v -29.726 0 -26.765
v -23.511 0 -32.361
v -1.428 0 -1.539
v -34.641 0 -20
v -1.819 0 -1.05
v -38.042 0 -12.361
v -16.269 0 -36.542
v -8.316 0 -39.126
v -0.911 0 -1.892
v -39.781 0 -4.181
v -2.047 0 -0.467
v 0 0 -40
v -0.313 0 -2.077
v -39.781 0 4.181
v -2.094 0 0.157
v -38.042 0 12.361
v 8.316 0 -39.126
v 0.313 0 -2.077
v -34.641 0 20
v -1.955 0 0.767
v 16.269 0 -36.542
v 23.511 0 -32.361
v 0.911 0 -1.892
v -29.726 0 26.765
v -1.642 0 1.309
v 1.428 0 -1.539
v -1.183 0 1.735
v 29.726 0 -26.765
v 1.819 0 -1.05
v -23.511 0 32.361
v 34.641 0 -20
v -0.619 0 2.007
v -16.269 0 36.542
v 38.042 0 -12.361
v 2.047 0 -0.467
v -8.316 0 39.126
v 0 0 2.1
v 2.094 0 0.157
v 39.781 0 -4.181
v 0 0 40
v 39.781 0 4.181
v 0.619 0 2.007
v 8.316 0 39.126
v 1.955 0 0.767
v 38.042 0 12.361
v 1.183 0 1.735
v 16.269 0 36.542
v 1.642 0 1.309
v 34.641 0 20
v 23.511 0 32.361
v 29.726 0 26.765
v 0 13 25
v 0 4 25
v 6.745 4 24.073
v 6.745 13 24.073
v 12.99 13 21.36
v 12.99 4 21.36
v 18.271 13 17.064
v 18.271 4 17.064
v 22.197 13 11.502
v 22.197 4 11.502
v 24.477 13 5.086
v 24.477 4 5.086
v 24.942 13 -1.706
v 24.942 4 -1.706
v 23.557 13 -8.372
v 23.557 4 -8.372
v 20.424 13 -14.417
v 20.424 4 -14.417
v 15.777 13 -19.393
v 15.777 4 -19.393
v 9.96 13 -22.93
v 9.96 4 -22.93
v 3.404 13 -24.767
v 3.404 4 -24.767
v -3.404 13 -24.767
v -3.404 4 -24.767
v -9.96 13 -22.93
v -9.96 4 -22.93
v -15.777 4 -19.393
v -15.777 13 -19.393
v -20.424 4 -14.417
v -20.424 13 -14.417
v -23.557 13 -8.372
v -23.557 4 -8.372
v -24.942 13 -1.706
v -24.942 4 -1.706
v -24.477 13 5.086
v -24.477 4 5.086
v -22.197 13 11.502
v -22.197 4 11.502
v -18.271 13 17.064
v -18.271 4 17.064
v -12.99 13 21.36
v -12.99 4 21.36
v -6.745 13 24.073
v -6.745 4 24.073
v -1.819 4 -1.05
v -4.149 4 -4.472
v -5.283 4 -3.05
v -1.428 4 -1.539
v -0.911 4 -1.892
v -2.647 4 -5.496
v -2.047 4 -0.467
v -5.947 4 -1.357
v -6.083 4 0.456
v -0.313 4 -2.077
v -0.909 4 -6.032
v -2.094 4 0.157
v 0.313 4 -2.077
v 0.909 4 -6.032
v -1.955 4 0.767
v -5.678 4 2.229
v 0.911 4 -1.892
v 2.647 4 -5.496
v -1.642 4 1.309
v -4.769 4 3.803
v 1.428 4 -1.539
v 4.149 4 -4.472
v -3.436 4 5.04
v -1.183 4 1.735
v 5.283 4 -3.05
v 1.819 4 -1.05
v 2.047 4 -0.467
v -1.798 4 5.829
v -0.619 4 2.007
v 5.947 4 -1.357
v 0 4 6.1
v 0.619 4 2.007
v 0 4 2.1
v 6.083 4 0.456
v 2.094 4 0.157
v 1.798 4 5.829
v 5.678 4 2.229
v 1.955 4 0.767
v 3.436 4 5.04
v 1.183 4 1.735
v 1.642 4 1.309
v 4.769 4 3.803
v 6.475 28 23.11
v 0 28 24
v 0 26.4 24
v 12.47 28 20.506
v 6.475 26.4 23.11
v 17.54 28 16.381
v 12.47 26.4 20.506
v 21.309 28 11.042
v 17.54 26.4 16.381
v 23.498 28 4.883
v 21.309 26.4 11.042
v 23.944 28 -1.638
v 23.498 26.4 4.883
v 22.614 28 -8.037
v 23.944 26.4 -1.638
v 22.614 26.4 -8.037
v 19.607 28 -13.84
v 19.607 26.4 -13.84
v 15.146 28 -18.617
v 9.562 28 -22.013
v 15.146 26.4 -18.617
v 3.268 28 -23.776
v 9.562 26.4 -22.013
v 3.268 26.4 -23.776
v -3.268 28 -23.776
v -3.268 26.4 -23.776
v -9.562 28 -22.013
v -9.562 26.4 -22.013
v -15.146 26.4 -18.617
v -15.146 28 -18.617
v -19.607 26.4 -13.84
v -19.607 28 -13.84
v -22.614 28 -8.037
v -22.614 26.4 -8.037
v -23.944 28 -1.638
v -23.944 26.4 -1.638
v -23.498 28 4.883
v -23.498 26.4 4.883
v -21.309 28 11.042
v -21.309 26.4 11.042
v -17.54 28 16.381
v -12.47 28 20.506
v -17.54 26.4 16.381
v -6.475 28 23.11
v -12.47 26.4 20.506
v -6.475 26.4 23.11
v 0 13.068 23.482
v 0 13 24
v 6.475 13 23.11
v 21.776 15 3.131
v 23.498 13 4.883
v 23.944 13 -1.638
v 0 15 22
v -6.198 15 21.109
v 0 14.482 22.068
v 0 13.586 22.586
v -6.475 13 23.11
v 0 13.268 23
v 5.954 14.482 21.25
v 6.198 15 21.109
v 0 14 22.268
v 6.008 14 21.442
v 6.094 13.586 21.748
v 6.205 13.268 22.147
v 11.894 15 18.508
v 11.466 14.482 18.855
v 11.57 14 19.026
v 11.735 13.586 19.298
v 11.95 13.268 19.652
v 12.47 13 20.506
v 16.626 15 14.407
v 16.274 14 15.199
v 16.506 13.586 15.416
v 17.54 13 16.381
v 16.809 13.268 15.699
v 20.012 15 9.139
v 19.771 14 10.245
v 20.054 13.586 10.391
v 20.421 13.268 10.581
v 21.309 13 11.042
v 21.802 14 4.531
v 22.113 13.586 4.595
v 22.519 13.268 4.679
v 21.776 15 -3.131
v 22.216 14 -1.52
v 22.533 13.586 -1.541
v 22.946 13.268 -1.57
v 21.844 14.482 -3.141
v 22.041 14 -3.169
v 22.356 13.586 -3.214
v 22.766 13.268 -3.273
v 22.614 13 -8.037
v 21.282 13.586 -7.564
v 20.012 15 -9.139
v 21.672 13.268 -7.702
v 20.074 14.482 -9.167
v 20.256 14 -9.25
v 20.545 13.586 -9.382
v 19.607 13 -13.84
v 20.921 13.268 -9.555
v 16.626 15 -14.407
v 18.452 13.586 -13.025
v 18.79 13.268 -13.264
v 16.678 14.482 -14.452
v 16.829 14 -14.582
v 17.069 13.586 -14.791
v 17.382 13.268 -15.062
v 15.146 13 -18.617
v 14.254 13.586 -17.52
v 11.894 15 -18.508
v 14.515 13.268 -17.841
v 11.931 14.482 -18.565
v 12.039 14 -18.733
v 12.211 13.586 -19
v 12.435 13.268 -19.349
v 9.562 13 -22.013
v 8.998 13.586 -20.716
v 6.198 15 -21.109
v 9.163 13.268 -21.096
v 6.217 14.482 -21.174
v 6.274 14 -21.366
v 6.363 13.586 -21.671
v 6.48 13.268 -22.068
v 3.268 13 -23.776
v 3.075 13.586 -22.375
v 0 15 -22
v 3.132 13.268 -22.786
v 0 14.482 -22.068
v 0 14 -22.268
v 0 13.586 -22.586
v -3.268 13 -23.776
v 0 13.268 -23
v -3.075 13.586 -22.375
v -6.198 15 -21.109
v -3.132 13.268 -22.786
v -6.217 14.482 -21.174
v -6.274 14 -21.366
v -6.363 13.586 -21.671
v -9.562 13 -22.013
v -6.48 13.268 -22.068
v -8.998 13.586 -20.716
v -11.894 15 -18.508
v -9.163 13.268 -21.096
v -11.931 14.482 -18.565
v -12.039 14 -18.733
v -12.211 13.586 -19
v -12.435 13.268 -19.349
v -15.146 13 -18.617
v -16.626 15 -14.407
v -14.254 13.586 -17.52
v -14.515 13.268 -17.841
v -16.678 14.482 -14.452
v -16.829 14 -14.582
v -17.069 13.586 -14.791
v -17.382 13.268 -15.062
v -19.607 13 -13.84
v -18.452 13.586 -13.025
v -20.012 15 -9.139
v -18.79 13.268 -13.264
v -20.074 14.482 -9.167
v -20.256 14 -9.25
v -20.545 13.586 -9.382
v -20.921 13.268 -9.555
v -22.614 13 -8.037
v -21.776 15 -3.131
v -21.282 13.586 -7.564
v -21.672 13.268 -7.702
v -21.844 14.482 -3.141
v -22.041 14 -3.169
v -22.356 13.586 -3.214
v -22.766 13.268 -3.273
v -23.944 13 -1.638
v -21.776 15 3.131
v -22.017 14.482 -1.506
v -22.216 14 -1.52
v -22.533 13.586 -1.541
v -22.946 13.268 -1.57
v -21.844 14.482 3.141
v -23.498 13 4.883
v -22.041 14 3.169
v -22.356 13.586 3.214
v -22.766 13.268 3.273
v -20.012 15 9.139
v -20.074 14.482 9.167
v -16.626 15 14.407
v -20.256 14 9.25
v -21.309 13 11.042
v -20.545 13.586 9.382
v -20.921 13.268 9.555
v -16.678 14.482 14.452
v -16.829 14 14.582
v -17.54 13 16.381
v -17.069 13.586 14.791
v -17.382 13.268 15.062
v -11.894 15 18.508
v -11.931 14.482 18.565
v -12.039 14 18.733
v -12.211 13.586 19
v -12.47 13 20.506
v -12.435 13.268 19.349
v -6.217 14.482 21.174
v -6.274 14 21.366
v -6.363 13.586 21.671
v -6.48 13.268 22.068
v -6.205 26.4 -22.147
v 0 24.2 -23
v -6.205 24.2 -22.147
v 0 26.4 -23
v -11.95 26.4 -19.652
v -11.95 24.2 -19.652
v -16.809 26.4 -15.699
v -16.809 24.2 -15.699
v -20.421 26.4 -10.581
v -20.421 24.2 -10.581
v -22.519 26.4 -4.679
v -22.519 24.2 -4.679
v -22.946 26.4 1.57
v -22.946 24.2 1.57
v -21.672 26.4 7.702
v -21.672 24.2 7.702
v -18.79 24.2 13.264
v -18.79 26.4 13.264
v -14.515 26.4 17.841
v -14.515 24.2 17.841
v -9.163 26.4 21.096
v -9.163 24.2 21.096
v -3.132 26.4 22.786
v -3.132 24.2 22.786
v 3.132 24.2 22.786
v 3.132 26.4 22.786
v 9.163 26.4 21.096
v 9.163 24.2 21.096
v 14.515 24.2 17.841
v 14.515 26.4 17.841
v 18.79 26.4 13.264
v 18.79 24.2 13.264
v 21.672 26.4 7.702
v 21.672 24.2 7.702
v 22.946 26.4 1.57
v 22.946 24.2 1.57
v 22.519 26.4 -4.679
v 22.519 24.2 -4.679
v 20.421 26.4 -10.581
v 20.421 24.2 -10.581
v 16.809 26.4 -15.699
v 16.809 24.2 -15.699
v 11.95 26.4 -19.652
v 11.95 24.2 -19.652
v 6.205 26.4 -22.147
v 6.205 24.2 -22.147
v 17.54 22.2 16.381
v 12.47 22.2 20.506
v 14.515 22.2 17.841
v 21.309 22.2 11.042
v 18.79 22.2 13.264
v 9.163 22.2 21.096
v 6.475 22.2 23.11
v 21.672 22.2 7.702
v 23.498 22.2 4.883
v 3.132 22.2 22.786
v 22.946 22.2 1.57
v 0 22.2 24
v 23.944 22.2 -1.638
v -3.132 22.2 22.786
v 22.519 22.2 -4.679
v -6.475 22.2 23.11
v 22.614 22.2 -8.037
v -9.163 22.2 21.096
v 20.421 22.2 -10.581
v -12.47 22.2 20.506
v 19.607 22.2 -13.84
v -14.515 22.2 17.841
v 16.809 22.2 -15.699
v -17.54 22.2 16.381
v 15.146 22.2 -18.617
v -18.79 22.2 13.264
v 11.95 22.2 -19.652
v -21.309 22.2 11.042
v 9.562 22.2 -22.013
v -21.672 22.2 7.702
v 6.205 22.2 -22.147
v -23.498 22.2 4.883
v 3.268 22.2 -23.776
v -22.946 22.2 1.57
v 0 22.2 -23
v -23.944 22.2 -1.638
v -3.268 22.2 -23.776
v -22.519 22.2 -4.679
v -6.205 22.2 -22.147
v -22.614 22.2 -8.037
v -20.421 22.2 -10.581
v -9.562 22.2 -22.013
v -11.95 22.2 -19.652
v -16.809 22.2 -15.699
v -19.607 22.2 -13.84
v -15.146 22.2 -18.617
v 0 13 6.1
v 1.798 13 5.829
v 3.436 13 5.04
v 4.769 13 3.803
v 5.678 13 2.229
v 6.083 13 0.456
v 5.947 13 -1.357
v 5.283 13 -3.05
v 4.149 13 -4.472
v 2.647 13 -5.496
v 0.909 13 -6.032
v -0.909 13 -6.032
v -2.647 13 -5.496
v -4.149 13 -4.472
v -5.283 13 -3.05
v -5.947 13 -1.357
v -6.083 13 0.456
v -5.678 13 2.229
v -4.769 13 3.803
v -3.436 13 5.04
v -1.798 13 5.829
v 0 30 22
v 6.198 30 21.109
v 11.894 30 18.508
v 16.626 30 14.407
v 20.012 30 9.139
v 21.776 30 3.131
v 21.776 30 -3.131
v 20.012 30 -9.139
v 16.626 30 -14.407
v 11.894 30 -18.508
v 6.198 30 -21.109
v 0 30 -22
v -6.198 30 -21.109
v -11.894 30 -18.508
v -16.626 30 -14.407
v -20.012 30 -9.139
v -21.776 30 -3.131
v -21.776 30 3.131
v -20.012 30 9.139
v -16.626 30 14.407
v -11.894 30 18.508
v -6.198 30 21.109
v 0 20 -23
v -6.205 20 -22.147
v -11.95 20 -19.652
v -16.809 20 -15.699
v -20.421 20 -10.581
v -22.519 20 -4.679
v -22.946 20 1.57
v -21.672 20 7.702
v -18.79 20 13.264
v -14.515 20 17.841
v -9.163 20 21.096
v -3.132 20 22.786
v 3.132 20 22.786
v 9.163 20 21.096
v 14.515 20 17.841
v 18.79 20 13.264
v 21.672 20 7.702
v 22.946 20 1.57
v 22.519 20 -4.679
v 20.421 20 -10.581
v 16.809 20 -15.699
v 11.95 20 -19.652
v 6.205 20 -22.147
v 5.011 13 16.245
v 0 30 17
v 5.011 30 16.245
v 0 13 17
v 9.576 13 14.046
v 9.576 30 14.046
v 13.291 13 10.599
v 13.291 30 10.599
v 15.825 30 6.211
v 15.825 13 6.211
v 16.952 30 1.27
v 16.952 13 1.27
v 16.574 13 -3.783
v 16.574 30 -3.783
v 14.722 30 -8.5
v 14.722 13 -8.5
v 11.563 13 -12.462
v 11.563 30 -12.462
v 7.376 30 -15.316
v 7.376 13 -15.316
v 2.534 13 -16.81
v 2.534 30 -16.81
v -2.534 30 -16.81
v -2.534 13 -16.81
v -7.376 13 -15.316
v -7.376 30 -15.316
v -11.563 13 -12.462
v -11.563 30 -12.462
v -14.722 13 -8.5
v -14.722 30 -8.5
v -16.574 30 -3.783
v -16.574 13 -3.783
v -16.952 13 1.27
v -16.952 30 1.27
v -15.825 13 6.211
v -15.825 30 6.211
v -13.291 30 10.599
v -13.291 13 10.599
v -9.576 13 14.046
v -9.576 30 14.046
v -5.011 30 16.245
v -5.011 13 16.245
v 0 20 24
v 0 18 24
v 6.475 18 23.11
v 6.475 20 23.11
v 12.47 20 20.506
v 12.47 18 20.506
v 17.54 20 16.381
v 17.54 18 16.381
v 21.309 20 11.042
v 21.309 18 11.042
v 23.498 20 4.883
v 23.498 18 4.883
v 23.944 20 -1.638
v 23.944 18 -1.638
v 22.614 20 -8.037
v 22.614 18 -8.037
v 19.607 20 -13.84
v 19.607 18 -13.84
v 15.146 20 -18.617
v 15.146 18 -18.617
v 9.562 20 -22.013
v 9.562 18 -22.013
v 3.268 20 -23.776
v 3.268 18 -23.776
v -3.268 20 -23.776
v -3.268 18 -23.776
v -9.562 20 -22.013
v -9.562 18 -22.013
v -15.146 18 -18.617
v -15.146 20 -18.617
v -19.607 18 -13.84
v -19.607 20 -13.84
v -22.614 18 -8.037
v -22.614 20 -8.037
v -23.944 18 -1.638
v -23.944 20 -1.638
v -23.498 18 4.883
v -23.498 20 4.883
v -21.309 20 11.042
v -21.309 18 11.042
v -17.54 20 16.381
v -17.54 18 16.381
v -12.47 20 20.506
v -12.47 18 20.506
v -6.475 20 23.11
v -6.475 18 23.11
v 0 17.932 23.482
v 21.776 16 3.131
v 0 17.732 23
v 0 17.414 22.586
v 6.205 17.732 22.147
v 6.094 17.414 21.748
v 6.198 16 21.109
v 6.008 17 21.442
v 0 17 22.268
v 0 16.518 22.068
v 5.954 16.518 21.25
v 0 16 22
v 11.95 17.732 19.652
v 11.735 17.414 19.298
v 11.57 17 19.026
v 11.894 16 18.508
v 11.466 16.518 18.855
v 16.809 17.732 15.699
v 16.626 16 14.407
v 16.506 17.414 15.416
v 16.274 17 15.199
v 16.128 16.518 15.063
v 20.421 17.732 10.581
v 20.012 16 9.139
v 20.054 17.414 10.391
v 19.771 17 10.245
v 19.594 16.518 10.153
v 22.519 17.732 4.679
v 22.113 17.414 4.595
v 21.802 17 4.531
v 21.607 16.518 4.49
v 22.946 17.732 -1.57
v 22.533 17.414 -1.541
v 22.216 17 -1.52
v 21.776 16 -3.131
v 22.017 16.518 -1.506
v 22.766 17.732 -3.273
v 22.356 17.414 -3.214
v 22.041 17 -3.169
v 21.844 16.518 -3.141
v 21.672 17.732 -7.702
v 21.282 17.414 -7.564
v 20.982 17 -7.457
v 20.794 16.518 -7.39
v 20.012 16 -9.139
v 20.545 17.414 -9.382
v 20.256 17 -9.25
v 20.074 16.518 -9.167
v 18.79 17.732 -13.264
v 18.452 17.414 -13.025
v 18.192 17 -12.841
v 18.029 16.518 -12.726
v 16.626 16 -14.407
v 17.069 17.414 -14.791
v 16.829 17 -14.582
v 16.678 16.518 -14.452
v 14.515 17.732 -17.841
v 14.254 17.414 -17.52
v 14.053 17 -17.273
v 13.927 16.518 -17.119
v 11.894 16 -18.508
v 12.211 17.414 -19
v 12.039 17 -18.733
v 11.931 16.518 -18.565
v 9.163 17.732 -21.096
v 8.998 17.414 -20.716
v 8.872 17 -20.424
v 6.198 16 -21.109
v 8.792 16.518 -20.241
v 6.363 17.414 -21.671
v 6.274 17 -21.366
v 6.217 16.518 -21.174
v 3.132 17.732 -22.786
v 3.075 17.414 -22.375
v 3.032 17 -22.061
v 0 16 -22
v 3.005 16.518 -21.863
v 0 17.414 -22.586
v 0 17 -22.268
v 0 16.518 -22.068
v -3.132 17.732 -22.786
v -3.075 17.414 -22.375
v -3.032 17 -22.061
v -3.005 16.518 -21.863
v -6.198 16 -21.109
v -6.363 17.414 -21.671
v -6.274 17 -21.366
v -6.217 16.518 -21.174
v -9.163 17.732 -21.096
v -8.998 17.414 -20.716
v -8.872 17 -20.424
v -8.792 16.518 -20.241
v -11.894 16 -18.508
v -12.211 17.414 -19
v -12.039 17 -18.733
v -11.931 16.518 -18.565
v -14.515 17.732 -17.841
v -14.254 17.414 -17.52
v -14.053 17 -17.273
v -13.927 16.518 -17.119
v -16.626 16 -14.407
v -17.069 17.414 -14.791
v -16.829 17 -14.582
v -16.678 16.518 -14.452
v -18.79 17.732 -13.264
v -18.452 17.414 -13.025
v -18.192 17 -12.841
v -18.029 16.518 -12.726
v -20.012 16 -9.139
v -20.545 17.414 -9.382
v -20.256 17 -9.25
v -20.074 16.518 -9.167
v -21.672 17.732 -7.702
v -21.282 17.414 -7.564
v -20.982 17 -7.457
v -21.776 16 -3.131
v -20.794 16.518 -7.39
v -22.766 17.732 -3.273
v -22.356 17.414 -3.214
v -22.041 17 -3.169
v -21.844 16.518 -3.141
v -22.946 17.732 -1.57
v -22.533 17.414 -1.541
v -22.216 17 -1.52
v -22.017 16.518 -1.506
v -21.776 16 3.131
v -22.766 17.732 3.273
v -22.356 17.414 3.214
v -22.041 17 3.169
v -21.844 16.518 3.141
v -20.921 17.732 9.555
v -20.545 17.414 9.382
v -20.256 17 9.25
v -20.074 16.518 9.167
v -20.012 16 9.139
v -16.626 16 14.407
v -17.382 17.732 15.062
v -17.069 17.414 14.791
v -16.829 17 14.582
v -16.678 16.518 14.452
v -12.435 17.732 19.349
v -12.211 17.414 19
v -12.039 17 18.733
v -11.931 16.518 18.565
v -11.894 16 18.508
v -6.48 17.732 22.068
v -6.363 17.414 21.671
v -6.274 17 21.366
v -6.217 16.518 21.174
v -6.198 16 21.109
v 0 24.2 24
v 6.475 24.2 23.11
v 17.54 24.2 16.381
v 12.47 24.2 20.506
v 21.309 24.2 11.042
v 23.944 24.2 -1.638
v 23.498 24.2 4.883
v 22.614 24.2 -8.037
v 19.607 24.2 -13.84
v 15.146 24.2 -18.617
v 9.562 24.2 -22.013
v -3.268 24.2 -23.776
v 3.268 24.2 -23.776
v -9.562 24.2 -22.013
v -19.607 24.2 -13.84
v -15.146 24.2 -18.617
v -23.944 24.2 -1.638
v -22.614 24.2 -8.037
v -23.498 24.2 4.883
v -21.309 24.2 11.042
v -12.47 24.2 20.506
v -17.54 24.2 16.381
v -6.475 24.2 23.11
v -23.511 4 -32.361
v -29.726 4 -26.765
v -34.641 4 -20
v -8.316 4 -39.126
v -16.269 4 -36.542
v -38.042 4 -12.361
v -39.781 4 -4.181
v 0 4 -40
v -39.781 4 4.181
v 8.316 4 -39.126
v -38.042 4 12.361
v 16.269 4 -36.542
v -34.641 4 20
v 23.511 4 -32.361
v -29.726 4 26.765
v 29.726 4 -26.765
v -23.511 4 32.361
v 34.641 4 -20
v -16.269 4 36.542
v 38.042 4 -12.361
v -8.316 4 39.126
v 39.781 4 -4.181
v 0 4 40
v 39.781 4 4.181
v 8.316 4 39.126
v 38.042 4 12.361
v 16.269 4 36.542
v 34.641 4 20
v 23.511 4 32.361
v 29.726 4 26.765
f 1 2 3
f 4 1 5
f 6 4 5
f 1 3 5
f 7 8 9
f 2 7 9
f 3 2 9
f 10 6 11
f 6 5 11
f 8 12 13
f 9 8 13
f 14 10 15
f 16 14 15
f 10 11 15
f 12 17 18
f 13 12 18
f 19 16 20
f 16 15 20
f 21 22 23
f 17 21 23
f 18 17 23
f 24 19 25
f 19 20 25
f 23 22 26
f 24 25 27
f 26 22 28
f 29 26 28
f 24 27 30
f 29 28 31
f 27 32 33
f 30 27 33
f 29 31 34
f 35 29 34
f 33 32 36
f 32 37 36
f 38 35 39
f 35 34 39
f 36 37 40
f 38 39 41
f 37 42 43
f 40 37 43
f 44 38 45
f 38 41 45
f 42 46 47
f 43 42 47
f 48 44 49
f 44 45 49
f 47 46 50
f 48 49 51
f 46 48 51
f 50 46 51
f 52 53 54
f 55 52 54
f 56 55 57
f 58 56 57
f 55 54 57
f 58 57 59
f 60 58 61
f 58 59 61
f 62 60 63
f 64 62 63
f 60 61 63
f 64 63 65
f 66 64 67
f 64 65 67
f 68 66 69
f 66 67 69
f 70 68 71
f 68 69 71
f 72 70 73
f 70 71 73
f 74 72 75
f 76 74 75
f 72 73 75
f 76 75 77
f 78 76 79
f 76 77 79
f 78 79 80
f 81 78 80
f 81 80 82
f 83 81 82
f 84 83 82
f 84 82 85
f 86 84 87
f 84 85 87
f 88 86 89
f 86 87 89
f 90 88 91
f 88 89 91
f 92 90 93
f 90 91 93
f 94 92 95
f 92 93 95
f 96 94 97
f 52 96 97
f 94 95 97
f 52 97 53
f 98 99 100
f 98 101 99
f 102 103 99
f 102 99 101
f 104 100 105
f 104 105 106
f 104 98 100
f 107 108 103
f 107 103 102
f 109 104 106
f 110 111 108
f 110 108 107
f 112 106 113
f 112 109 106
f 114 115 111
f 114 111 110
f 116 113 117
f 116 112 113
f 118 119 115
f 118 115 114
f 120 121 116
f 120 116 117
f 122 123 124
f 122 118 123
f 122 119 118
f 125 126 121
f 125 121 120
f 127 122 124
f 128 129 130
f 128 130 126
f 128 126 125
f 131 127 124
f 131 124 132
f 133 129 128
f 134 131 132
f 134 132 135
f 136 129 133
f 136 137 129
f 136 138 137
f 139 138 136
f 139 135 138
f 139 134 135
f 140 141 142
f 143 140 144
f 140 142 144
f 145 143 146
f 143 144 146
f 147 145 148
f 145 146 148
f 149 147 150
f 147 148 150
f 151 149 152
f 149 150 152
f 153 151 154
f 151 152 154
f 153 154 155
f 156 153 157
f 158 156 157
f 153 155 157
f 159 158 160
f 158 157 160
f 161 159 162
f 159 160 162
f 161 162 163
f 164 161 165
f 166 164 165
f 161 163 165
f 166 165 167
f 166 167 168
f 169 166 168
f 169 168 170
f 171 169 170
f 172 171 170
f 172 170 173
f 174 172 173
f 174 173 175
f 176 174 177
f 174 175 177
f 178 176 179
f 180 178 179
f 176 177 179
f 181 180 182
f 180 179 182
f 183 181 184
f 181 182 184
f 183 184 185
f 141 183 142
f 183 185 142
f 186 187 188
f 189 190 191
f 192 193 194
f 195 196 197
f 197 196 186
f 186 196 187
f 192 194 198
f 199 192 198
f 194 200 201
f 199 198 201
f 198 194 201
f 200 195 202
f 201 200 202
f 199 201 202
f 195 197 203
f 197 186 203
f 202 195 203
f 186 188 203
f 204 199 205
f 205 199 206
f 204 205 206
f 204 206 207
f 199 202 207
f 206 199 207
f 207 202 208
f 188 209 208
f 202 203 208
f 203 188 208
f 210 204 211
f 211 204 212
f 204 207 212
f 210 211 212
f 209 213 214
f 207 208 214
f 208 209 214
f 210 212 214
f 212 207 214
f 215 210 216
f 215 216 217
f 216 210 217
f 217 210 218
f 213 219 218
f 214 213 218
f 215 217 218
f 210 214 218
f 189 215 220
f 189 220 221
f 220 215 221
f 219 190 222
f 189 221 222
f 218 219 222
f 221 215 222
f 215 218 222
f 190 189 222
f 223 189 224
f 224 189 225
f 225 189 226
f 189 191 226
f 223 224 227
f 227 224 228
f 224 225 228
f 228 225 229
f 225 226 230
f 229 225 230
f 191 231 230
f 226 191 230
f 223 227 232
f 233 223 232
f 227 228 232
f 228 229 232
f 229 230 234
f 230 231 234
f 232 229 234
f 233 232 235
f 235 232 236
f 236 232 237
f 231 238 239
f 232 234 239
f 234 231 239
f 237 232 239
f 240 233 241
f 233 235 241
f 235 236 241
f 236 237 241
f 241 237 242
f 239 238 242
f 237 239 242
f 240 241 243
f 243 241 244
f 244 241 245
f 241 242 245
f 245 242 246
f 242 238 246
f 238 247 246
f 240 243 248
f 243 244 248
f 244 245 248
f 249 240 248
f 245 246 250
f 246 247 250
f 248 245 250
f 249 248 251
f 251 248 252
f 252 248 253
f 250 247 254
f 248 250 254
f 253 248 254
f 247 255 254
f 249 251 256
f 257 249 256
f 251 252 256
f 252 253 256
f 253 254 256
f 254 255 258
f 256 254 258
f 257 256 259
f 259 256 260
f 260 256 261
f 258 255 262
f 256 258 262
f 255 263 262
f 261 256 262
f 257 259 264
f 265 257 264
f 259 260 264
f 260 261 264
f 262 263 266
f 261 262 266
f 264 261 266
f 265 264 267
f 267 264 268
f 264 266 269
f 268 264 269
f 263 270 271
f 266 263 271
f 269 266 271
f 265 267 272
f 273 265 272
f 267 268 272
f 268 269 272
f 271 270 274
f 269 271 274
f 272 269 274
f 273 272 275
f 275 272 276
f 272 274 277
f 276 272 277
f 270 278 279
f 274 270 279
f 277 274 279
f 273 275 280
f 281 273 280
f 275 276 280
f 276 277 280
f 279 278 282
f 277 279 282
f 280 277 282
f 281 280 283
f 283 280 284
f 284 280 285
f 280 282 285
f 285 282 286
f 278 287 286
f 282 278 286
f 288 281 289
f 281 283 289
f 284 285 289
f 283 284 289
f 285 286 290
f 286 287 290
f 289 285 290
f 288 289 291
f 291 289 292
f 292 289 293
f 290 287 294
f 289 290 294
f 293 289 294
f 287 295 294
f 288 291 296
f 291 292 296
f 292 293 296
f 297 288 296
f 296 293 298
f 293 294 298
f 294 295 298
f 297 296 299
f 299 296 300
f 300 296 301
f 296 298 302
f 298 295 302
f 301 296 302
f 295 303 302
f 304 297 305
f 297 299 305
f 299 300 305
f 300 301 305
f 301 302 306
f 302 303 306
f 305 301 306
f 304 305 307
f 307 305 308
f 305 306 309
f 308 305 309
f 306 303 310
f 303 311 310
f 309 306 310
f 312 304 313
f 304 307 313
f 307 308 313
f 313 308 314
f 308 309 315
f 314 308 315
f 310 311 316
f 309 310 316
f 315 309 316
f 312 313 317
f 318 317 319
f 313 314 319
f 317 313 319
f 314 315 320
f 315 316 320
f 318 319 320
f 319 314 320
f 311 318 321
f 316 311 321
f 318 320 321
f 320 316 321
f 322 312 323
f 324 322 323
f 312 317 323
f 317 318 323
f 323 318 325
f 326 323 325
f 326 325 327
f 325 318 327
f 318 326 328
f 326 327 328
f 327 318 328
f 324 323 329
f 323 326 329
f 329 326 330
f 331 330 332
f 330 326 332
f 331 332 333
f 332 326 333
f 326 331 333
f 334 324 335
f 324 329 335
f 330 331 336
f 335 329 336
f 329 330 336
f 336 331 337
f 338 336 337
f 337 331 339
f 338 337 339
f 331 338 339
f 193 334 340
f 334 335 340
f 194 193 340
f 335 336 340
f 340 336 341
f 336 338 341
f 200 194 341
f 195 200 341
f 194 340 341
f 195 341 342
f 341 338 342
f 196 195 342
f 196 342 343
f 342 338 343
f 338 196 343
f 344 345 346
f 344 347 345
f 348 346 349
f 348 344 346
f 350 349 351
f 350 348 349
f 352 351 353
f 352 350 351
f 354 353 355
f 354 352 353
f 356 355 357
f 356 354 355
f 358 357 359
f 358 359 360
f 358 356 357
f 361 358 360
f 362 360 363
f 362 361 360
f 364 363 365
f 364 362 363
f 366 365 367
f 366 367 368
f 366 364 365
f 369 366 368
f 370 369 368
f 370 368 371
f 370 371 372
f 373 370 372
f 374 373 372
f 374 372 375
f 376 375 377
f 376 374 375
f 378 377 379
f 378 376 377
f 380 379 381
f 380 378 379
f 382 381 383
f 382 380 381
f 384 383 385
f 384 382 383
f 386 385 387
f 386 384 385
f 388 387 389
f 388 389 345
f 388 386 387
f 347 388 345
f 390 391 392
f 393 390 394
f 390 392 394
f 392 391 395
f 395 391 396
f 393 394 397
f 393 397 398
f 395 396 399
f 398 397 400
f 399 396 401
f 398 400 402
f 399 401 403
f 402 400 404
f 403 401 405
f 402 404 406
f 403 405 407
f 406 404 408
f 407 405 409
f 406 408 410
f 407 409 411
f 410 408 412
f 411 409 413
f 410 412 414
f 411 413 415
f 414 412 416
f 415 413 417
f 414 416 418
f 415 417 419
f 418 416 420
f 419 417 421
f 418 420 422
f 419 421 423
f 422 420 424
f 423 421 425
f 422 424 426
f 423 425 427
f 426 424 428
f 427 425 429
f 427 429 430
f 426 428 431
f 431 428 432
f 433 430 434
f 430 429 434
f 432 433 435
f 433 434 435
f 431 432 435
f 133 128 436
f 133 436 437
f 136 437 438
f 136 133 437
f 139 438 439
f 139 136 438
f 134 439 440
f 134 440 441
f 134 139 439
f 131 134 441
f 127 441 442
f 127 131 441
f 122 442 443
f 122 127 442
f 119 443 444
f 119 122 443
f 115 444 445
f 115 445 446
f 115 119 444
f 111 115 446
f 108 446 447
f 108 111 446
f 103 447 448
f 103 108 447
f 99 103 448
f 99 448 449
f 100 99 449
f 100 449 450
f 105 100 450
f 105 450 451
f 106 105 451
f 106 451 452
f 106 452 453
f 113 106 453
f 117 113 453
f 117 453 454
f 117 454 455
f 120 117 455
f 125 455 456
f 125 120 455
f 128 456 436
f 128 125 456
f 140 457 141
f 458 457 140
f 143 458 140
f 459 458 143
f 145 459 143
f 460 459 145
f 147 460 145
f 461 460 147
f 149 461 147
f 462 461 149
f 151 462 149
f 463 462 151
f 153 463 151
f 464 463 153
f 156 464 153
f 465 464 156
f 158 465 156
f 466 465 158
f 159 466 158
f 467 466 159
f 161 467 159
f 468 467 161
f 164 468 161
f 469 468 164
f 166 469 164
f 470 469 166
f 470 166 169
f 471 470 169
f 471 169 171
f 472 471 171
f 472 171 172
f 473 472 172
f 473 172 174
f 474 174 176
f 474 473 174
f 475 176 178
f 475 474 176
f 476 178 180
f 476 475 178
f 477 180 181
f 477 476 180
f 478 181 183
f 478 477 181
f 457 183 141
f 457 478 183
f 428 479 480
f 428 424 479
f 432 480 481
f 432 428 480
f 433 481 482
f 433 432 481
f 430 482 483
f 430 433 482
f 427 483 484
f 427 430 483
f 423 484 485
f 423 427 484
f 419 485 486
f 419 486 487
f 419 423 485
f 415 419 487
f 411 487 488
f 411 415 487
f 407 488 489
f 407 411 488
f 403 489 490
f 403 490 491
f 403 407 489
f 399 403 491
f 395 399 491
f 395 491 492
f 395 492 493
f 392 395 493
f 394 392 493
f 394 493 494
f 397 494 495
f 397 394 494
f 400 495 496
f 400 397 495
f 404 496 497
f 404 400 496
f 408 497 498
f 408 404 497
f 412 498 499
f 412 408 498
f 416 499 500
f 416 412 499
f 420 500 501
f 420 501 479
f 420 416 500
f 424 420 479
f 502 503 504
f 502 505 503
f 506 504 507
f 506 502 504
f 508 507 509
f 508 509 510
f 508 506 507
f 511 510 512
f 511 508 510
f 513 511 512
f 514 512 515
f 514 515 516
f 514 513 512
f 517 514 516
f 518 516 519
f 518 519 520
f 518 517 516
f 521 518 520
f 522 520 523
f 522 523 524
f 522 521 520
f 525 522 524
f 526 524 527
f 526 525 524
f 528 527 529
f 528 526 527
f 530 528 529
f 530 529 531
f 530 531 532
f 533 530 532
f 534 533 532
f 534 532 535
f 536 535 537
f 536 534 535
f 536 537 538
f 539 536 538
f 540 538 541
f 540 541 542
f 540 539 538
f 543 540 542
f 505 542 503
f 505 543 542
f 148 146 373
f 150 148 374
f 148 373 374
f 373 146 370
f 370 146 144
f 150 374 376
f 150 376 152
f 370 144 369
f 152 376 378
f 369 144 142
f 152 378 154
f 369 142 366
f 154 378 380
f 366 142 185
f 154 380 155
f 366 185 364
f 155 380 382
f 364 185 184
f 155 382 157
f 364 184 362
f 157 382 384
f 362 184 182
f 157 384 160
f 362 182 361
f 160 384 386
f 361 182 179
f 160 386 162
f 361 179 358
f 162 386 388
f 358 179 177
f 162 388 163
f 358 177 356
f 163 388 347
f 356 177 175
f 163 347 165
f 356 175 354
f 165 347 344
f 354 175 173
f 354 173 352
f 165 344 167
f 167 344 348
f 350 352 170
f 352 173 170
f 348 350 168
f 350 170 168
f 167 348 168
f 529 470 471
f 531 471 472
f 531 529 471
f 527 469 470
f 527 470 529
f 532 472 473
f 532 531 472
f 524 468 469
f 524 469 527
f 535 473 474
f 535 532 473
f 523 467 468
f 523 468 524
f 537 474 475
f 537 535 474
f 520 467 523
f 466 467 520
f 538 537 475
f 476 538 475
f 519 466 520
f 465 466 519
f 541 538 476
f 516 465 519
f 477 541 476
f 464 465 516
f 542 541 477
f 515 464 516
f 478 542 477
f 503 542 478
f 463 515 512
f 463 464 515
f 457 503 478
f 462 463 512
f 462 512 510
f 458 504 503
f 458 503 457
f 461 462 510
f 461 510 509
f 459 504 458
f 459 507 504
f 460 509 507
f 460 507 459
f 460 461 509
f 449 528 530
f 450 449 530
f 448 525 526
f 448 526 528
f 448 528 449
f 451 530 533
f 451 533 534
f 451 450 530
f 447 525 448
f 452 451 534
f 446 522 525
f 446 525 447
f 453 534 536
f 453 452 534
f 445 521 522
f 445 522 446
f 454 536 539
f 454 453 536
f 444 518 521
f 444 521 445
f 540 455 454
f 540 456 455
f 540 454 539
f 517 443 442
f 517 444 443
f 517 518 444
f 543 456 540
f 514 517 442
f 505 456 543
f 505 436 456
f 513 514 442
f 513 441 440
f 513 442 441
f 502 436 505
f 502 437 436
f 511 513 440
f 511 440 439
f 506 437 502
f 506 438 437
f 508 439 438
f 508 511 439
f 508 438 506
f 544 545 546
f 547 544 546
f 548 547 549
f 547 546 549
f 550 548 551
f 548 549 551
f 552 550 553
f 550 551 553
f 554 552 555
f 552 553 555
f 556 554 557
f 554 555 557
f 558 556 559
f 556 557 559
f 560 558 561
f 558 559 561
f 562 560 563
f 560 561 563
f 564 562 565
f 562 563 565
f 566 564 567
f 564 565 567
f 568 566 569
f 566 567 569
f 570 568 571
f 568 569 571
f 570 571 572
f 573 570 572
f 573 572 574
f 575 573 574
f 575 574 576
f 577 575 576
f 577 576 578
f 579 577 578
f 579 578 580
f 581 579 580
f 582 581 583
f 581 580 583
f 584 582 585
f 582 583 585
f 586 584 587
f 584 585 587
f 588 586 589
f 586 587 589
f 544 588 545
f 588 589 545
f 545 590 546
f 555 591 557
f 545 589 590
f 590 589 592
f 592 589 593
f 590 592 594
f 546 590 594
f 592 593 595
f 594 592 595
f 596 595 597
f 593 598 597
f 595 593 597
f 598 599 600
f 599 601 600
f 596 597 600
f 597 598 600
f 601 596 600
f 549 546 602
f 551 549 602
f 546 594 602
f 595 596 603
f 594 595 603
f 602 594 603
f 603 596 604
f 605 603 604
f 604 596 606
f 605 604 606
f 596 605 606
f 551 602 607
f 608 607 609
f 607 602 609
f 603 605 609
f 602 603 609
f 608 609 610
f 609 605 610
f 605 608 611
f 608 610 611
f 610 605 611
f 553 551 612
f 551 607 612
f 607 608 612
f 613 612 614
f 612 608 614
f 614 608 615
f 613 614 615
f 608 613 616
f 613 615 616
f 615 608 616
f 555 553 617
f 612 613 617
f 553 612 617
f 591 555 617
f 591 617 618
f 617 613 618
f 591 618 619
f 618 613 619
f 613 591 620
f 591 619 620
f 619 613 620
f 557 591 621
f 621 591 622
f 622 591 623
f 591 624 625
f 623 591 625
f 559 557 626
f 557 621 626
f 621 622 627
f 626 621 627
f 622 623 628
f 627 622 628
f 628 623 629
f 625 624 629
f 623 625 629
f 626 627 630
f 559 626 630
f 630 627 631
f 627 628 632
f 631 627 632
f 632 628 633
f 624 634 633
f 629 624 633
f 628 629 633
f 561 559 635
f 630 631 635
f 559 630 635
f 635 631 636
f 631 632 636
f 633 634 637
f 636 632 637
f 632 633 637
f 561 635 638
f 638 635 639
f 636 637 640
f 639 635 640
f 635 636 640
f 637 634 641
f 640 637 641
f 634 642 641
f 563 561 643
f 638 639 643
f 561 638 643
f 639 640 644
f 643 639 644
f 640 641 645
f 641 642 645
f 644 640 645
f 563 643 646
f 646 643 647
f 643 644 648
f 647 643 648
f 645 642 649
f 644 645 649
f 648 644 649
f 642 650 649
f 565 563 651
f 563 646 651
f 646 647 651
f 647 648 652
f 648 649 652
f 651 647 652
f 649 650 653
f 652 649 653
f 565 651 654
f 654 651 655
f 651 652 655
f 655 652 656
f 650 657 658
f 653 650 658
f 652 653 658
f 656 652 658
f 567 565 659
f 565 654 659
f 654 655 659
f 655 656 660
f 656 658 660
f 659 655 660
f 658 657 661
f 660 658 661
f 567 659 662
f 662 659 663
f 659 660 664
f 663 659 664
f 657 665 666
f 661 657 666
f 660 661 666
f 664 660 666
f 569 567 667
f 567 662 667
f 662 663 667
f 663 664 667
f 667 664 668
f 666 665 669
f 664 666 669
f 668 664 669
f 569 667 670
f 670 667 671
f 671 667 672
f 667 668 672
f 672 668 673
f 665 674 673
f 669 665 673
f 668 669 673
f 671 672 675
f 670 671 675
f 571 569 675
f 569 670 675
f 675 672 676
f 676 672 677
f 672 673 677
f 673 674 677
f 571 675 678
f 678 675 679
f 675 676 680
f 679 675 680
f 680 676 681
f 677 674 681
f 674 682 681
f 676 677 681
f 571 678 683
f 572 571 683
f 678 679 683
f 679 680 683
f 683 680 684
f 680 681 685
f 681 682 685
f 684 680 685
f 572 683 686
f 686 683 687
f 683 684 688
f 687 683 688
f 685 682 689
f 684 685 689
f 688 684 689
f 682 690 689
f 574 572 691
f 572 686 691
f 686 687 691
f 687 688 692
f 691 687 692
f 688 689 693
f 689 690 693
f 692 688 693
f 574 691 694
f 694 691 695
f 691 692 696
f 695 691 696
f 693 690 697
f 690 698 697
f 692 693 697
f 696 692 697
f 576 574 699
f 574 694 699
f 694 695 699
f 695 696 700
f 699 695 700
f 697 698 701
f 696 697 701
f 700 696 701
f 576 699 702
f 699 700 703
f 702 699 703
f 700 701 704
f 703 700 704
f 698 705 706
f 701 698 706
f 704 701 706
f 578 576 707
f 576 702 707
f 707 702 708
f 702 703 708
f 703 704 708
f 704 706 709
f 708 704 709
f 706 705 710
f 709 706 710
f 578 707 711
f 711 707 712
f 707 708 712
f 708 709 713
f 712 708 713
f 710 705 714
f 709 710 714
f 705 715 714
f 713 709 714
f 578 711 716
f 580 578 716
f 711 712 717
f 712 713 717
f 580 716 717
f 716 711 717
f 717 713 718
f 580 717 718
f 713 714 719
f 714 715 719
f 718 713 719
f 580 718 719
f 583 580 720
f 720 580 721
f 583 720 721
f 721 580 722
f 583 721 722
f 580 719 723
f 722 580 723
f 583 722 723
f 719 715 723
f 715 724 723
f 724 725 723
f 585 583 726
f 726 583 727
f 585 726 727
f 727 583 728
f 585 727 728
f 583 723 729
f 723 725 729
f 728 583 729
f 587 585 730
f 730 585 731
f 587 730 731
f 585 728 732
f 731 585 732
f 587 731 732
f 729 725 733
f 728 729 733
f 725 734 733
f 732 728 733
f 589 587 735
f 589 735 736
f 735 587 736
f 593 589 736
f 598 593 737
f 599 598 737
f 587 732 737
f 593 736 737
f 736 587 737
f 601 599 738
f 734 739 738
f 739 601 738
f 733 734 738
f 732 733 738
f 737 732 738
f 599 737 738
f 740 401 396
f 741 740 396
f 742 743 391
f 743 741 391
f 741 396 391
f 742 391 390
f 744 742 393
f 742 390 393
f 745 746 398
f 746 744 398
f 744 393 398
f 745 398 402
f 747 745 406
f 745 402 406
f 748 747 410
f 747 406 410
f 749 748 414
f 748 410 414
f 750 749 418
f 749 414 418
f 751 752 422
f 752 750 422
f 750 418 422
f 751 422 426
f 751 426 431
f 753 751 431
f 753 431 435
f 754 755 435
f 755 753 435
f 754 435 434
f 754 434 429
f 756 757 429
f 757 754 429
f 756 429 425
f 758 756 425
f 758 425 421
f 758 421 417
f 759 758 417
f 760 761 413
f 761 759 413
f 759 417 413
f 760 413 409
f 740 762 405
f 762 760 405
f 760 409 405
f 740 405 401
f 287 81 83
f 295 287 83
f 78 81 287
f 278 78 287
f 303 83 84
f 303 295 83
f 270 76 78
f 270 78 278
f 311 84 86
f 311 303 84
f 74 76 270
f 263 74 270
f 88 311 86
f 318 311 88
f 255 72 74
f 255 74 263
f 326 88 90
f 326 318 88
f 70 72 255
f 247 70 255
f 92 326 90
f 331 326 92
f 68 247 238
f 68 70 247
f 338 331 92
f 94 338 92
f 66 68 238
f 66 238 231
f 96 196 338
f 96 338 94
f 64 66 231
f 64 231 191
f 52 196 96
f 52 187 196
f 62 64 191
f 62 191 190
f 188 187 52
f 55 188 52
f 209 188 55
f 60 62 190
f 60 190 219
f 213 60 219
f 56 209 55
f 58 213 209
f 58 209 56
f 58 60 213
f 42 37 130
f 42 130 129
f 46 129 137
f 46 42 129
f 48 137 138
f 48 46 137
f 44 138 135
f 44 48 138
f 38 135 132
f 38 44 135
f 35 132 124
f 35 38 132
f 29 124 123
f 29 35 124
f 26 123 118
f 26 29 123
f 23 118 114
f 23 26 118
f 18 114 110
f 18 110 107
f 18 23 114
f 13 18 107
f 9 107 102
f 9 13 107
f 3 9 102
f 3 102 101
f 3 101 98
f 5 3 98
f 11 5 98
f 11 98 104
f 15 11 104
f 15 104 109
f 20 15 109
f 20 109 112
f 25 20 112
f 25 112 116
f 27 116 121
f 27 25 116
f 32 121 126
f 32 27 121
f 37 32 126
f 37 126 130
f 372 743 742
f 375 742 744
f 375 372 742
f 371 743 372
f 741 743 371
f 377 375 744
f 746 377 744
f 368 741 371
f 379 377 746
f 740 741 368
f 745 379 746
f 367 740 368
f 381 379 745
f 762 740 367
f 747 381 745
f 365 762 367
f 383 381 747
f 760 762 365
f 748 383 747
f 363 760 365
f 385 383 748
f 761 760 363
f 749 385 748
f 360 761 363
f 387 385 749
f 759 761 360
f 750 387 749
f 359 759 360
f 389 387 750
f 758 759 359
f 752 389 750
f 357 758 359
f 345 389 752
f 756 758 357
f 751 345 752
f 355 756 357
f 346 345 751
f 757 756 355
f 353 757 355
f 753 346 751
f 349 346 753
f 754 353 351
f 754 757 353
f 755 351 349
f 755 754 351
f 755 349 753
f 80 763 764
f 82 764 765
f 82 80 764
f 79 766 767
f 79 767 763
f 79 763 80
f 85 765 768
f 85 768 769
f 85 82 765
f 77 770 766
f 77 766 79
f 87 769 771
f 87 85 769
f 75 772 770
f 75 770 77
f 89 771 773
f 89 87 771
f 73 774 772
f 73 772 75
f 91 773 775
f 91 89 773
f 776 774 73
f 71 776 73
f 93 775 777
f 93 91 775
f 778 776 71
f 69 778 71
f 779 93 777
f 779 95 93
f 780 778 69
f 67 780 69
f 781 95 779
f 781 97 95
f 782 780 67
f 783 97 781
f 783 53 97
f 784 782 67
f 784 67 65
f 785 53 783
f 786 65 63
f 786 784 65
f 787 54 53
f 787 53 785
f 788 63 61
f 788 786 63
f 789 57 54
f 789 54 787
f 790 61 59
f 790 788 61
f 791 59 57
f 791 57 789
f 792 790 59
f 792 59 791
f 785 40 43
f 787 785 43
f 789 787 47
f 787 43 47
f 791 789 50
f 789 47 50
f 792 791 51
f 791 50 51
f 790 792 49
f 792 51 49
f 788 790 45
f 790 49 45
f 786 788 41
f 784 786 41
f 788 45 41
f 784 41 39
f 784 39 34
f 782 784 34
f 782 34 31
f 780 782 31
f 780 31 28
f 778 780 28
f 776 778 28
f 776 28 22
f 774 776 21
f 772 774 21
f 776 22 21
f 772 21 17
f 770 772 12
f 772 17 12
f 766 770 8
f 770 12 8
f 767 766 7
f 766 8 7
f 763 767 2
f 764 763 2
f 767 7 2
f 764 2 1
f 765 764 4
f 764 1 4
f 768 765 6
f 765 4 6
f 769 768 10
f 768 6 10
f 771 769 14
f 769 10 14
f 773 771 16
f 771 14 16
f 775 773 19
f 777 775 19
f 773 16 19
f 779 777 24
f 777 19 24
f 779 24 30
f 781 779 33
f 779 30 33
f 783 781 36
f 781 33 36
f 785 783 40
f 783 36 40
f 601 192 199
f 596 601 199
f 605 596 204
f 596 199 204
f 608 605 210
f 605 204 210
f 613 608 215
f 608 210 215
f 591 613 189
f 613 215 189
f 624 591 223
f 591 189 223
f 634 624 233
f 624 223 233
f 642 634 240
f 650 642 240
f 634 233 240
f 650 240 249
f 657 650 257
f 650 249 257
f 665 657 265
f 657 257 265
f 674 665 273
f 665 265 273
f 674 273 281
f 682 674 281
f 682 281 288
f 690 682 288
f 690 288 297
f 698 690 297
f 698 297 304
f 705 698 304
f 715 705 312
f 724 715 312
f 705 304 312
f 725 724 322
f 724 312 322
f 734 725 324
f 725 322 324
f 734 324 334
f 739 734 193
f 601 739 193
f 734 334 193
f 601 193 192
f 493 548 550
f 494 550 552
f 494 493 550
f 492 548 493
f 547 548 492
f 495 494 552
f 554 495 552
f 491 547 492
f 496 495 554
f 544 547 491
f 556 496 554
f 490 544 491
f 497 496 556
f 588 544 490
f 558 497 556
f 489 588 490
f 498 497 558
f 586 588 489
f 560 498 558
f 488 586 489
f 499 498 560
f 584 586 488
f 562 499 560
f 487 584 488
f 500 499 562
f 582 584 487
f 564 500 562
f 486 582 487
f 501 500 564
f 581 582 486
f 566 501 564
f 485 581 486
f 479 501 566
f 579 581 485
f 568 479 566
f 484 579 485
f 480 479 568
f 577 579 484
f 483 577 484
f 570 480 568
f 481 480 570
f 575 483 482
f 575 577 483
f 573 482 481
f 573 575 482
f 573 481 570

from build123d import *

# Parameters (mm, degrees)
SKETCH1_R           = 40
SKETCH1_R_2         = 2.1
BOSS_EXTRUDE1_DEPTH = 4
SKETCH2_R           = 25
SKETCH2_R_2         = 6.1
BOSS_EXTRUDE5_DEPTH = 9
SKETCH6_R           = 22
SKETCH6_R_2         = 17
BOSS_EXTRUDE6_DEPTH = 5
SKETCH7_R           = 24
SKETCH7_R_2         = 17
BOSS_EXTRUDE7_DEPTH = 12
SKETCH9_W           = 1
SKETCH9_H           = 2.2
CHAMFER1_SIZE       = 2
FILLET1_R           = 2


with BuildPart() as part:
    # Sketch1 → Boss-Extrude1 (new body)
    with BuildSketch(Plane(origin=(0, 0, 0), x_dir=(1, 0, 0), z_dir=(0, 1, 0))):
        with Locations(Location((0, 0, 0), (0, 0, 270))):
            Circle(SKETCH1_R)
        with Locations(Location((0, 0, 0), (0, 0, 270))):
            Circle(SKETCH1_R_2, mode=Mode.SUBTRACT)
    extrude(amount=BOSS_EXTRUDE1_DEPTH)

    # Sketch2 → Boss-Extrude5 (add)
    with BuildSketch(Plane(origin=(0, 4, 0), x_dir=(1, 0, 0), z_dir=(0, 1, 0))):
        with Locations(Location((0, 0, 0), (0, 0, 270))):
            Circle(SKETCH2_R)
        with Locations(Location((0, 0, 0), (0, 0, 270))):
            Circle(SKETCH2_R_2, mode=Mode.SUBTRACT)
    extrude(amount=BOSS_EXTRUDE5_DEPTH)

    # Sketch6 → Boss-Extrude6 (add)
    with BuildSketch(Plane(origin=(0, 13, 0), x_dir=(1, 0, 0), z_dir=(0, 1, 0))):
        with Locations(Location((0, 0, 0), (0, 0, 270))):
            Circle(SKETCH6_R)
        with Locations(Location((0, 0, 0), (0, 0, 270))):
            Circle(SKETCH6_R_2, mode=Mode.SUBTRACT)
    extrude(amount=BOSS_EXTRUDE6_DEPTH)

    # Sketch7 → Boss-Extrude7 (add)
    with BuildSketch(Plane(origin=(0, 18, 0), x_dir=(1, 0, 0), z_dir=(0, 1, 0))):
        with Locations(Location((0, 0, 0), (0, 0, 270))):
            Circle(SKETCH7_R)
        with Locations(Location((0, 0, 0), (0, 0, 270))):
            Circle(SKETCH7_R_2, mode=Mode.SUBTRACT)
    extrude(amount=BOSS_EXTRUDE7_DEPTH)

    # Sketch9 → Cut-Revolve1 (revolve, cut)
    with BuildSketch(Plane(origin=(0, 0, 0), x_dir=(0, 0, -1), z_dir=(1, 0, 0)), mode=Mode.PRIVATE) as cut_revolve1_sk:
        with Locations((-23.5, 25.3)):
            Rectangle(SKETCH9_W, SKETCH9_H)
        with Locations((-23.5, 21.1)):
            Rectangle(SKETCH9_W, SKETCH9_H)
    revolve(cut_revolve1_sk.sketch.rotate(Axis((0, 0, 0), (0, 1, 0)), 180), axis=Axis((0, 0, 0), (0, 1, 0)), mode=Mode.SUBTRACT)

    # Chamfer1
    chamfer1_edges = [part.edges().sort_by_distance(p)[0] for p in [
        (0, 30, -24),
    ]]
    chamfer(chamfer1_edges, length=CHAMFER1_SIZE)

    # Fillet1
    fillet1_edges = [part.edges().sort_by_distance(p)[0] for p in [
        (0, 18, -22),
        (0, 13, -22),
    ]]
    fillet(fillet1_edges, radius=FILLET1_R - 0.0001)  # a hair under: the kernel refuses the full size


solid = part.part
